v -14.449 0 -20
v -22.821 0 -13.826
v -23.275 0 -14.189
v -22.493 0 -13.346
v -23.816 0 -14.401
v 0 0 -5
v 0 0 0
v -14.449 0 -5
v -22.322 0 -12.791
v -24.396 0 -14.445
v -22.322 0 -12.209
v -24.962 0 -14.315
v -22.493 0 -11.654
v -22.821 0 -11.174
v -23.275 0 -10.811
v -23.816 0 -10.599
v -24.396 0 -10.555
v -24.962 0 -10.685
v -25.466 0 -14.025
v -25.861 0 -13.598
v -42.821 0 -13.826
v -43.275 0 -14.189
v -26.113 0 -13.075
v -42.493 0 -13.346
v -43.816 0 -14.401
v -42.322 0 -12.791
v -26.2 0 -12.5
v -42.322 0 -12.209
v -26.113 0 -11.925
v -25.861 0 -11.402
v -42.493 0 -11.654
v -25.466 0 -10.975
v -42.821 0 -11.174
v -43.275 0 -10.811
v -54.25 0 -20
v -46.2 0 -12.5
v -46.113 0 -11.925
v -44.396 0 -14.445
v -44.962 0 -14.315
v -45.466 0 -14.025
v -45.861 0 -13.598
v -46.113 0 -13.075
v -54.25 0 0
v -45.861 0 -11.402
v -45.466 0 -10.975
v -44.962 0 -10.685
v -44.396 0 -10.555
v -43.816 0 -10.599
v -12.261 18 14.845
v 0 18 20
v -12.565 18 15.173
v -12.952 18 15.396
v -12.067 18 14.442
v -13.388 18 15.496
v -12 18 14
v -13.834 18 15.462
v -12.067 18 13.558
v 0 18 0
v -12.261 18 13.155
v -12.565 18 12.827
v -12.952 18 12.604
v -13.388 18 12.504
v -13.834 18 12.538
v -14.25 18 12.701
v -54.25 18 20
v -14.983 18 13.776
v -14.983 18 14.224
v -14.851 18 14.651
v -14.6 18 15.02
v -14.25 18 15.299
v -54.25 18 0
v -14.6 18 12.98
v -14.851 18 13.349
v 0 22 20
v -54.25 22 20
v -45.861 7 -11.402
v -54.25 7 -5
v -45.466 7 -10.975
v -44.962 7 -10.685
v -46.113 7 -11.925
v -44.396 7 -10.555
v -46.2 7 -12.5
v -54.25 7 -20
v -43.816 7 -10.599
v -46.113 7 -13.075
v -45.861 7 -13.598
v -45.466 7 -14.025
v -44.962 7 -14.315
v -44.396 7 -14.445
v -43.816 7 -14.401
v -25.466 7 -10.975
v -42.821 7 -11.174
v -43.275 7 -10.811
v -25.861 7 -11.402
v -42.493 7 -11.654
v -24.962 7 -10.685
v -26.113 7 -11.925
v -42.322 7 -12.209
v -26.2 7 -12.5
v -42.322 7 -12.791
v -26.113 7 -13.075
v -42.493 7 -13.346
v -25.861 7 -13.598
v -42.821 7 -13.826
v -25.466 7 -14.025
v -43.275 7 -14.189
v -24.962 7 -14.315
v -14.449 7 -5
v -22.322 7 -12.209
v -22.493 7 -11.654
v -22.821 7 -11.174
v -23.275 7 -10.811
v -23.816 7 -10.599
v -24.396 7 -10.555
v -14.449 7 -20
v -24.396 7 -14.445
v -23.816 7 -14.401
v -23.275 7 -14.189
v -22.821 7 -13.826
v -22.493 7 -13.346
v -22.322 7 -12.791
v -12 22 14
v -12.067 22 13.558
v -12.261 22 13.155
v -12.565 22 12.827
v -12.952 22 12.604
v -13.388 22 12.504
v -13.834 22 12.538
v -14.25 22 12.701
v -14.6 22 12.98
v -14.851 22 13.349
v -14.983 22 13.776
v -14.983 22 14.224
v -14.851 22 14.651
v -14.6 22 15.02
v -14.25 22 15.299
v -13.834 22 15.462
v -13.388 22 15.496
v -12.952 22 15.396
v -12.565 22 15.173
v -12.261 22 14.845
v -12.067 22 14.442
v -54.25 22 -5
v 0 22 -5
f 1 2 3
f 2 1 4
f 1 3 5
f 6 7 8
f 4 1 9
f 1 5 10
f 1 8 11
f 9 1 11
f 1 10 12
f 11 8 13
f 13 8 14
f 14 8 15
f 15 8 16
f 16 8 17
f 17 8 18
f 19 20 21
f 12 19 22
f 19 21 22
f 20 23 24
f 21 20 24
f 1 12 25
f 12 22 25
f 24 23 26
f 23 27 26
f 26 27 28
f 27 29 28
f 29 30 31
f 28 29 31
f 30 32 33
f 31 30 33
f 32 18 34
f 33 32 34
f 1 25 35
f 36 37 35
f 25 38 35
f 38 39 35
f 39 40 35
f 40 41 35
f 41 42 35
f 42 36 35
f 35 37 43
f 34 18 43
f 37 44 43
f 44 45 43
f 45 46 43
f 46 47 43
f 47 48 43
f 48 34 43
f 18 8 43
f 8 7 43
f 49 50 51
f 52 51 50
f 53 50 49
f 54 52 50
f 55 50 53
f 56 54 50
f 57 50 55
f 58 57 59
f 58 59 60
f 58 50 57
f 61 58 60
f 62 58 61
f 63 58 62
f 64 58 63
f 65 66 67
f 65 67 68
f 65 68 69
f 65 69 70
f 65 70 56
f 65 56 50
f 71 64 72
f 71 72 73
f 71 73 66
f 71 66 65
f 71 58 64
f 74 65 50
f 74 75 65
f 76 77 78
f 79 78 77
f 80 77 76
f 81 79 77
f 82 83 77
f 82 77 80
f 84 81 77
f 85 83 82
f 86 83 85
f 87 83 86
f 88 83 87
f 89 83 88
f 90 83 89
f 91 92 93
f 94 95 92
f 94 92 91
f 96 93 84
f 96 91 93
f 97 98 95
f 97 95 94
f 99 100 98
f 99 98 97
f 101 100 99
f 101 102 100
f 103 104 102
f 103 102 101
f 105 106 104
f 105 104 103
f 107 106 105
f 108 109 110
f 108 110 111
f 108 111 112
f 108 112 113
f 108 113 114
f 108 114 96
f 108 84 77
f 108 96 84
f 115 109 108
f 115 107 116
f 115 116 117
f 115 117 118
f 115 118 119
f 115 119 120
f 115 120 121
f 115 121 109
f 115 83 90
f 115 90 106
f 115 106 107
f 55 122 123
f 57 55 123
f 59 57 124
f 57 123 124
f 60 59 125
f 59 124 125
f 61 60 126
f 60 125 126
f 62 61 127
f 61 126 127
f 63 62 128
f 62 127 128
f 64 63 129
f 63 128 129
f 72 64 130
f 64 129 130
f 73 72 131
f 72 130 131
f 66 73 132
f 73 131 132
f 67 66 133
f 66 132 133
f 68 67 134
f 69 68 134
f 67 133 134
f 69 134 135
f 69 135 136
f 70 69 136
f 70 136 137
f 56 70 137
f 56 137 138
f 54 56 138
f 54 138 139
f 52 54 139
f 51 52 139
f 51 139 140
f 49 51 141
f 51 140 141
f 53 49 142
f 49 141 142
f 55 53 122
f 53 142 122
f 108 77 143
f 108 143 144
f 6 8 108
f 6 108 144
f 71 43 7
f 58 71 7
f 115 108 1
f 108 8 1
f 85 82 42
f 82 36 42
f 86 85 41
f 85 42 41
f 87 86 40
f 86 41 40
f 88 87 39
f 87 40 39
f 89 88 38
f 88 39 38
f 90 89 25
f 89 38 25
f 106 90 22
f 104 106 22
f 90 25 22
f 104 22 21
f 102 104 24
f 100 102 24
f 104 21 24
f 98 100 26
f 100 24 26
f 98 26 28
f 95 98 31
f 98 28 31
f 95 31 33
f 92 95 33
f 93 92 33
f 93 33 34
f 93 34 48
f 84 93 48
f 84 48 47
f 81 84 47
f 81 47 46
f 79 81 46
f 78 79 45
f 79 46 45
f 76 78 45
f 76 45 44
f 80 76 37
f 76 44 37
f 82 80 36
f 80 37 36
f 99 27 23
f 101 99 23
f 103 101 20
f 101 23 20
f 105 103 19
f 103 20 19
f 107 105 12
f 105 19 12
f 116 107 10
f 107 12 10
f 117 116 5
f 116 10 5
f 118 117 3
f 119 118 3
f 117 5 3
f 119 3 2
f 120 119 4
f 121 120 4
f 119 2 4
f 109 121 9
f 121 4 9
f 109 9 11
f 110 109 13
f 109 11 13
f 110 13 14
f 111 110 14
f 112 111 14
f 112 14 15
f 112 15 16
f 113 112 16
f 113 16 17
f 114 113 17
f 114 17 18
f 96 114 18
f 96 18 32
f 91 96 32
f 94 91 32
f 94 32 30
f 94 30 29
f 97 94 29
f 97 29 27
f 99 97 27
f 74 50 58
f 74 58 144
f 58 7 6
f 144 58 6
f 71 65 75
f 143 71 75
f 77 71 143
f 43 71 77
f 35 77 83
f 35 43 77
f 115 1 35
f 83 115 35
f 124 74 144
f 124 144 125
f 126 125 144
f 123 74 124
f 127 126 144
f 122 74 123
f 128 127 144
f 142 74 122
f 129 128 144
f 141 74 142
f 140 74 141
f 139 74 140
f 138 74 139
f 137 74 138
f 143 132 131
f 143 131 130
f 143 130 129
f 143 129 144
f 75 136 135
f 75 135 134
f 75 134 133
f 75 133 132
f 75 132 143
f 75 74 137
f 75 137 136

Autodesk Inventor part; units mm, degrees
ref_plane "YZ Plane" through (0, 0, 0) normal (1, 0, 0) x (0, 1, 0)
ref_plane "XZ Plane" through (0, 0, 0) normal (0, 1, 0) x (-1, 0, 0)
ref_plane "XY Plane" through (0, 0, 0) normal (0, 0, 1) x (1, 0, 0)
sketch "Эскиз1" plane through (0, 0, 0) normal (0, 1, 0) x (-1, 0, 0)
  circle A0 centre (24.25, -12.5) radius 1.95
  circle A1 centre (44.25, -12.5) radius 1.95
  line L0 (68.5, 0) -> (0, 0)
  line L1 (0, 0) -> (0, -5)
  line L2 (14.449, -5) -> (0, -5)
  line L3 (14.449, -5) -> (14.449, -20)
  line L4 (14.449, -20) -> (54.25, -20)
  line L5 (54.25, -5) -> (54.25, -20)
  line L6 (68.5, -5) -> (54.25, -5)
  line L7 (68.5, 0) -> (68.5, -5)
  point P0 (-5.75, 0)
extrude "Выдавливание1" add sketch "Эскиз1" along normal blind 22
sketch "Эскиз2" plane through (-68.5, 0, 0) normal (0, 0, 1) x (1, 0, 0)
  line L0 (0, 0) -> (0, 22) projected
  line L1 (0, 22) -> (68.5, 22) projected
  line L2 (68.5, 0) -> (68.5, 22) projected
  line L3 (0, 22) -> (68.5, 22)
  line L4 (68.5, 22) -> (68.5, 18)
  line L5 (68.5, 18) -> (0, 18)
  line L6 (0, 18) -> (0, 22)
  dimension "d2" = 4
extrude "Выдавливание2" add sketch "Эскиз2" along normal blind 20
sketch "Эскиз3" plane through (0, 22, 0) normal (0, 1, 0) x (1, 0, 0)
  line L0 (0, 5) -> (-14.449, 5) projected
  line L1 (-54.25, 20) -> (-14.449, 20)
  line L2 (-14.449, 20) -> (-14.449, 5)
  line L3 (-14.449, 5) -> (-54.25, 5)
  line L4 (-54.25, 5) -> (-54.25, 20)
  point P0 (0, 0)
extrude "Выдавливание3" cut sketch "Эскиз3" against normal blind 15
sketch "Эскиз4" plane through (0, 22, 0) normal (0, 1, 0) x (1, 0, 0)
  line L0 (-68.5, -20) -> (0, -20) projected
  line L1 (0, -20) -> (-13.5, -20)
  line L2 (-13.5, -20) -> (-13.5, -14)
  line L3 (-13.5, -14) -> (0, -14)
  line L4 (0, -14) -> (0, -20)
  circle A0 centre (-13.5, -14) radius 1.5
  point P0 (0, 0)
  dimension "d7" = 13.5
  dimension "d8" = 6
  dimension "d9" = 3
extrude "Выдавливание4" cut sketch "Эскиз4" against normal blind 15 contours A0 L3 L2 | L2 L3 A0
move faces "Перенос1" translate (14.25, 0, 0) faces at (-68.5, 13.3333, -3.3333)
properties part number "КВ33.044.703 - Стойка оптического датчика оси Y"
